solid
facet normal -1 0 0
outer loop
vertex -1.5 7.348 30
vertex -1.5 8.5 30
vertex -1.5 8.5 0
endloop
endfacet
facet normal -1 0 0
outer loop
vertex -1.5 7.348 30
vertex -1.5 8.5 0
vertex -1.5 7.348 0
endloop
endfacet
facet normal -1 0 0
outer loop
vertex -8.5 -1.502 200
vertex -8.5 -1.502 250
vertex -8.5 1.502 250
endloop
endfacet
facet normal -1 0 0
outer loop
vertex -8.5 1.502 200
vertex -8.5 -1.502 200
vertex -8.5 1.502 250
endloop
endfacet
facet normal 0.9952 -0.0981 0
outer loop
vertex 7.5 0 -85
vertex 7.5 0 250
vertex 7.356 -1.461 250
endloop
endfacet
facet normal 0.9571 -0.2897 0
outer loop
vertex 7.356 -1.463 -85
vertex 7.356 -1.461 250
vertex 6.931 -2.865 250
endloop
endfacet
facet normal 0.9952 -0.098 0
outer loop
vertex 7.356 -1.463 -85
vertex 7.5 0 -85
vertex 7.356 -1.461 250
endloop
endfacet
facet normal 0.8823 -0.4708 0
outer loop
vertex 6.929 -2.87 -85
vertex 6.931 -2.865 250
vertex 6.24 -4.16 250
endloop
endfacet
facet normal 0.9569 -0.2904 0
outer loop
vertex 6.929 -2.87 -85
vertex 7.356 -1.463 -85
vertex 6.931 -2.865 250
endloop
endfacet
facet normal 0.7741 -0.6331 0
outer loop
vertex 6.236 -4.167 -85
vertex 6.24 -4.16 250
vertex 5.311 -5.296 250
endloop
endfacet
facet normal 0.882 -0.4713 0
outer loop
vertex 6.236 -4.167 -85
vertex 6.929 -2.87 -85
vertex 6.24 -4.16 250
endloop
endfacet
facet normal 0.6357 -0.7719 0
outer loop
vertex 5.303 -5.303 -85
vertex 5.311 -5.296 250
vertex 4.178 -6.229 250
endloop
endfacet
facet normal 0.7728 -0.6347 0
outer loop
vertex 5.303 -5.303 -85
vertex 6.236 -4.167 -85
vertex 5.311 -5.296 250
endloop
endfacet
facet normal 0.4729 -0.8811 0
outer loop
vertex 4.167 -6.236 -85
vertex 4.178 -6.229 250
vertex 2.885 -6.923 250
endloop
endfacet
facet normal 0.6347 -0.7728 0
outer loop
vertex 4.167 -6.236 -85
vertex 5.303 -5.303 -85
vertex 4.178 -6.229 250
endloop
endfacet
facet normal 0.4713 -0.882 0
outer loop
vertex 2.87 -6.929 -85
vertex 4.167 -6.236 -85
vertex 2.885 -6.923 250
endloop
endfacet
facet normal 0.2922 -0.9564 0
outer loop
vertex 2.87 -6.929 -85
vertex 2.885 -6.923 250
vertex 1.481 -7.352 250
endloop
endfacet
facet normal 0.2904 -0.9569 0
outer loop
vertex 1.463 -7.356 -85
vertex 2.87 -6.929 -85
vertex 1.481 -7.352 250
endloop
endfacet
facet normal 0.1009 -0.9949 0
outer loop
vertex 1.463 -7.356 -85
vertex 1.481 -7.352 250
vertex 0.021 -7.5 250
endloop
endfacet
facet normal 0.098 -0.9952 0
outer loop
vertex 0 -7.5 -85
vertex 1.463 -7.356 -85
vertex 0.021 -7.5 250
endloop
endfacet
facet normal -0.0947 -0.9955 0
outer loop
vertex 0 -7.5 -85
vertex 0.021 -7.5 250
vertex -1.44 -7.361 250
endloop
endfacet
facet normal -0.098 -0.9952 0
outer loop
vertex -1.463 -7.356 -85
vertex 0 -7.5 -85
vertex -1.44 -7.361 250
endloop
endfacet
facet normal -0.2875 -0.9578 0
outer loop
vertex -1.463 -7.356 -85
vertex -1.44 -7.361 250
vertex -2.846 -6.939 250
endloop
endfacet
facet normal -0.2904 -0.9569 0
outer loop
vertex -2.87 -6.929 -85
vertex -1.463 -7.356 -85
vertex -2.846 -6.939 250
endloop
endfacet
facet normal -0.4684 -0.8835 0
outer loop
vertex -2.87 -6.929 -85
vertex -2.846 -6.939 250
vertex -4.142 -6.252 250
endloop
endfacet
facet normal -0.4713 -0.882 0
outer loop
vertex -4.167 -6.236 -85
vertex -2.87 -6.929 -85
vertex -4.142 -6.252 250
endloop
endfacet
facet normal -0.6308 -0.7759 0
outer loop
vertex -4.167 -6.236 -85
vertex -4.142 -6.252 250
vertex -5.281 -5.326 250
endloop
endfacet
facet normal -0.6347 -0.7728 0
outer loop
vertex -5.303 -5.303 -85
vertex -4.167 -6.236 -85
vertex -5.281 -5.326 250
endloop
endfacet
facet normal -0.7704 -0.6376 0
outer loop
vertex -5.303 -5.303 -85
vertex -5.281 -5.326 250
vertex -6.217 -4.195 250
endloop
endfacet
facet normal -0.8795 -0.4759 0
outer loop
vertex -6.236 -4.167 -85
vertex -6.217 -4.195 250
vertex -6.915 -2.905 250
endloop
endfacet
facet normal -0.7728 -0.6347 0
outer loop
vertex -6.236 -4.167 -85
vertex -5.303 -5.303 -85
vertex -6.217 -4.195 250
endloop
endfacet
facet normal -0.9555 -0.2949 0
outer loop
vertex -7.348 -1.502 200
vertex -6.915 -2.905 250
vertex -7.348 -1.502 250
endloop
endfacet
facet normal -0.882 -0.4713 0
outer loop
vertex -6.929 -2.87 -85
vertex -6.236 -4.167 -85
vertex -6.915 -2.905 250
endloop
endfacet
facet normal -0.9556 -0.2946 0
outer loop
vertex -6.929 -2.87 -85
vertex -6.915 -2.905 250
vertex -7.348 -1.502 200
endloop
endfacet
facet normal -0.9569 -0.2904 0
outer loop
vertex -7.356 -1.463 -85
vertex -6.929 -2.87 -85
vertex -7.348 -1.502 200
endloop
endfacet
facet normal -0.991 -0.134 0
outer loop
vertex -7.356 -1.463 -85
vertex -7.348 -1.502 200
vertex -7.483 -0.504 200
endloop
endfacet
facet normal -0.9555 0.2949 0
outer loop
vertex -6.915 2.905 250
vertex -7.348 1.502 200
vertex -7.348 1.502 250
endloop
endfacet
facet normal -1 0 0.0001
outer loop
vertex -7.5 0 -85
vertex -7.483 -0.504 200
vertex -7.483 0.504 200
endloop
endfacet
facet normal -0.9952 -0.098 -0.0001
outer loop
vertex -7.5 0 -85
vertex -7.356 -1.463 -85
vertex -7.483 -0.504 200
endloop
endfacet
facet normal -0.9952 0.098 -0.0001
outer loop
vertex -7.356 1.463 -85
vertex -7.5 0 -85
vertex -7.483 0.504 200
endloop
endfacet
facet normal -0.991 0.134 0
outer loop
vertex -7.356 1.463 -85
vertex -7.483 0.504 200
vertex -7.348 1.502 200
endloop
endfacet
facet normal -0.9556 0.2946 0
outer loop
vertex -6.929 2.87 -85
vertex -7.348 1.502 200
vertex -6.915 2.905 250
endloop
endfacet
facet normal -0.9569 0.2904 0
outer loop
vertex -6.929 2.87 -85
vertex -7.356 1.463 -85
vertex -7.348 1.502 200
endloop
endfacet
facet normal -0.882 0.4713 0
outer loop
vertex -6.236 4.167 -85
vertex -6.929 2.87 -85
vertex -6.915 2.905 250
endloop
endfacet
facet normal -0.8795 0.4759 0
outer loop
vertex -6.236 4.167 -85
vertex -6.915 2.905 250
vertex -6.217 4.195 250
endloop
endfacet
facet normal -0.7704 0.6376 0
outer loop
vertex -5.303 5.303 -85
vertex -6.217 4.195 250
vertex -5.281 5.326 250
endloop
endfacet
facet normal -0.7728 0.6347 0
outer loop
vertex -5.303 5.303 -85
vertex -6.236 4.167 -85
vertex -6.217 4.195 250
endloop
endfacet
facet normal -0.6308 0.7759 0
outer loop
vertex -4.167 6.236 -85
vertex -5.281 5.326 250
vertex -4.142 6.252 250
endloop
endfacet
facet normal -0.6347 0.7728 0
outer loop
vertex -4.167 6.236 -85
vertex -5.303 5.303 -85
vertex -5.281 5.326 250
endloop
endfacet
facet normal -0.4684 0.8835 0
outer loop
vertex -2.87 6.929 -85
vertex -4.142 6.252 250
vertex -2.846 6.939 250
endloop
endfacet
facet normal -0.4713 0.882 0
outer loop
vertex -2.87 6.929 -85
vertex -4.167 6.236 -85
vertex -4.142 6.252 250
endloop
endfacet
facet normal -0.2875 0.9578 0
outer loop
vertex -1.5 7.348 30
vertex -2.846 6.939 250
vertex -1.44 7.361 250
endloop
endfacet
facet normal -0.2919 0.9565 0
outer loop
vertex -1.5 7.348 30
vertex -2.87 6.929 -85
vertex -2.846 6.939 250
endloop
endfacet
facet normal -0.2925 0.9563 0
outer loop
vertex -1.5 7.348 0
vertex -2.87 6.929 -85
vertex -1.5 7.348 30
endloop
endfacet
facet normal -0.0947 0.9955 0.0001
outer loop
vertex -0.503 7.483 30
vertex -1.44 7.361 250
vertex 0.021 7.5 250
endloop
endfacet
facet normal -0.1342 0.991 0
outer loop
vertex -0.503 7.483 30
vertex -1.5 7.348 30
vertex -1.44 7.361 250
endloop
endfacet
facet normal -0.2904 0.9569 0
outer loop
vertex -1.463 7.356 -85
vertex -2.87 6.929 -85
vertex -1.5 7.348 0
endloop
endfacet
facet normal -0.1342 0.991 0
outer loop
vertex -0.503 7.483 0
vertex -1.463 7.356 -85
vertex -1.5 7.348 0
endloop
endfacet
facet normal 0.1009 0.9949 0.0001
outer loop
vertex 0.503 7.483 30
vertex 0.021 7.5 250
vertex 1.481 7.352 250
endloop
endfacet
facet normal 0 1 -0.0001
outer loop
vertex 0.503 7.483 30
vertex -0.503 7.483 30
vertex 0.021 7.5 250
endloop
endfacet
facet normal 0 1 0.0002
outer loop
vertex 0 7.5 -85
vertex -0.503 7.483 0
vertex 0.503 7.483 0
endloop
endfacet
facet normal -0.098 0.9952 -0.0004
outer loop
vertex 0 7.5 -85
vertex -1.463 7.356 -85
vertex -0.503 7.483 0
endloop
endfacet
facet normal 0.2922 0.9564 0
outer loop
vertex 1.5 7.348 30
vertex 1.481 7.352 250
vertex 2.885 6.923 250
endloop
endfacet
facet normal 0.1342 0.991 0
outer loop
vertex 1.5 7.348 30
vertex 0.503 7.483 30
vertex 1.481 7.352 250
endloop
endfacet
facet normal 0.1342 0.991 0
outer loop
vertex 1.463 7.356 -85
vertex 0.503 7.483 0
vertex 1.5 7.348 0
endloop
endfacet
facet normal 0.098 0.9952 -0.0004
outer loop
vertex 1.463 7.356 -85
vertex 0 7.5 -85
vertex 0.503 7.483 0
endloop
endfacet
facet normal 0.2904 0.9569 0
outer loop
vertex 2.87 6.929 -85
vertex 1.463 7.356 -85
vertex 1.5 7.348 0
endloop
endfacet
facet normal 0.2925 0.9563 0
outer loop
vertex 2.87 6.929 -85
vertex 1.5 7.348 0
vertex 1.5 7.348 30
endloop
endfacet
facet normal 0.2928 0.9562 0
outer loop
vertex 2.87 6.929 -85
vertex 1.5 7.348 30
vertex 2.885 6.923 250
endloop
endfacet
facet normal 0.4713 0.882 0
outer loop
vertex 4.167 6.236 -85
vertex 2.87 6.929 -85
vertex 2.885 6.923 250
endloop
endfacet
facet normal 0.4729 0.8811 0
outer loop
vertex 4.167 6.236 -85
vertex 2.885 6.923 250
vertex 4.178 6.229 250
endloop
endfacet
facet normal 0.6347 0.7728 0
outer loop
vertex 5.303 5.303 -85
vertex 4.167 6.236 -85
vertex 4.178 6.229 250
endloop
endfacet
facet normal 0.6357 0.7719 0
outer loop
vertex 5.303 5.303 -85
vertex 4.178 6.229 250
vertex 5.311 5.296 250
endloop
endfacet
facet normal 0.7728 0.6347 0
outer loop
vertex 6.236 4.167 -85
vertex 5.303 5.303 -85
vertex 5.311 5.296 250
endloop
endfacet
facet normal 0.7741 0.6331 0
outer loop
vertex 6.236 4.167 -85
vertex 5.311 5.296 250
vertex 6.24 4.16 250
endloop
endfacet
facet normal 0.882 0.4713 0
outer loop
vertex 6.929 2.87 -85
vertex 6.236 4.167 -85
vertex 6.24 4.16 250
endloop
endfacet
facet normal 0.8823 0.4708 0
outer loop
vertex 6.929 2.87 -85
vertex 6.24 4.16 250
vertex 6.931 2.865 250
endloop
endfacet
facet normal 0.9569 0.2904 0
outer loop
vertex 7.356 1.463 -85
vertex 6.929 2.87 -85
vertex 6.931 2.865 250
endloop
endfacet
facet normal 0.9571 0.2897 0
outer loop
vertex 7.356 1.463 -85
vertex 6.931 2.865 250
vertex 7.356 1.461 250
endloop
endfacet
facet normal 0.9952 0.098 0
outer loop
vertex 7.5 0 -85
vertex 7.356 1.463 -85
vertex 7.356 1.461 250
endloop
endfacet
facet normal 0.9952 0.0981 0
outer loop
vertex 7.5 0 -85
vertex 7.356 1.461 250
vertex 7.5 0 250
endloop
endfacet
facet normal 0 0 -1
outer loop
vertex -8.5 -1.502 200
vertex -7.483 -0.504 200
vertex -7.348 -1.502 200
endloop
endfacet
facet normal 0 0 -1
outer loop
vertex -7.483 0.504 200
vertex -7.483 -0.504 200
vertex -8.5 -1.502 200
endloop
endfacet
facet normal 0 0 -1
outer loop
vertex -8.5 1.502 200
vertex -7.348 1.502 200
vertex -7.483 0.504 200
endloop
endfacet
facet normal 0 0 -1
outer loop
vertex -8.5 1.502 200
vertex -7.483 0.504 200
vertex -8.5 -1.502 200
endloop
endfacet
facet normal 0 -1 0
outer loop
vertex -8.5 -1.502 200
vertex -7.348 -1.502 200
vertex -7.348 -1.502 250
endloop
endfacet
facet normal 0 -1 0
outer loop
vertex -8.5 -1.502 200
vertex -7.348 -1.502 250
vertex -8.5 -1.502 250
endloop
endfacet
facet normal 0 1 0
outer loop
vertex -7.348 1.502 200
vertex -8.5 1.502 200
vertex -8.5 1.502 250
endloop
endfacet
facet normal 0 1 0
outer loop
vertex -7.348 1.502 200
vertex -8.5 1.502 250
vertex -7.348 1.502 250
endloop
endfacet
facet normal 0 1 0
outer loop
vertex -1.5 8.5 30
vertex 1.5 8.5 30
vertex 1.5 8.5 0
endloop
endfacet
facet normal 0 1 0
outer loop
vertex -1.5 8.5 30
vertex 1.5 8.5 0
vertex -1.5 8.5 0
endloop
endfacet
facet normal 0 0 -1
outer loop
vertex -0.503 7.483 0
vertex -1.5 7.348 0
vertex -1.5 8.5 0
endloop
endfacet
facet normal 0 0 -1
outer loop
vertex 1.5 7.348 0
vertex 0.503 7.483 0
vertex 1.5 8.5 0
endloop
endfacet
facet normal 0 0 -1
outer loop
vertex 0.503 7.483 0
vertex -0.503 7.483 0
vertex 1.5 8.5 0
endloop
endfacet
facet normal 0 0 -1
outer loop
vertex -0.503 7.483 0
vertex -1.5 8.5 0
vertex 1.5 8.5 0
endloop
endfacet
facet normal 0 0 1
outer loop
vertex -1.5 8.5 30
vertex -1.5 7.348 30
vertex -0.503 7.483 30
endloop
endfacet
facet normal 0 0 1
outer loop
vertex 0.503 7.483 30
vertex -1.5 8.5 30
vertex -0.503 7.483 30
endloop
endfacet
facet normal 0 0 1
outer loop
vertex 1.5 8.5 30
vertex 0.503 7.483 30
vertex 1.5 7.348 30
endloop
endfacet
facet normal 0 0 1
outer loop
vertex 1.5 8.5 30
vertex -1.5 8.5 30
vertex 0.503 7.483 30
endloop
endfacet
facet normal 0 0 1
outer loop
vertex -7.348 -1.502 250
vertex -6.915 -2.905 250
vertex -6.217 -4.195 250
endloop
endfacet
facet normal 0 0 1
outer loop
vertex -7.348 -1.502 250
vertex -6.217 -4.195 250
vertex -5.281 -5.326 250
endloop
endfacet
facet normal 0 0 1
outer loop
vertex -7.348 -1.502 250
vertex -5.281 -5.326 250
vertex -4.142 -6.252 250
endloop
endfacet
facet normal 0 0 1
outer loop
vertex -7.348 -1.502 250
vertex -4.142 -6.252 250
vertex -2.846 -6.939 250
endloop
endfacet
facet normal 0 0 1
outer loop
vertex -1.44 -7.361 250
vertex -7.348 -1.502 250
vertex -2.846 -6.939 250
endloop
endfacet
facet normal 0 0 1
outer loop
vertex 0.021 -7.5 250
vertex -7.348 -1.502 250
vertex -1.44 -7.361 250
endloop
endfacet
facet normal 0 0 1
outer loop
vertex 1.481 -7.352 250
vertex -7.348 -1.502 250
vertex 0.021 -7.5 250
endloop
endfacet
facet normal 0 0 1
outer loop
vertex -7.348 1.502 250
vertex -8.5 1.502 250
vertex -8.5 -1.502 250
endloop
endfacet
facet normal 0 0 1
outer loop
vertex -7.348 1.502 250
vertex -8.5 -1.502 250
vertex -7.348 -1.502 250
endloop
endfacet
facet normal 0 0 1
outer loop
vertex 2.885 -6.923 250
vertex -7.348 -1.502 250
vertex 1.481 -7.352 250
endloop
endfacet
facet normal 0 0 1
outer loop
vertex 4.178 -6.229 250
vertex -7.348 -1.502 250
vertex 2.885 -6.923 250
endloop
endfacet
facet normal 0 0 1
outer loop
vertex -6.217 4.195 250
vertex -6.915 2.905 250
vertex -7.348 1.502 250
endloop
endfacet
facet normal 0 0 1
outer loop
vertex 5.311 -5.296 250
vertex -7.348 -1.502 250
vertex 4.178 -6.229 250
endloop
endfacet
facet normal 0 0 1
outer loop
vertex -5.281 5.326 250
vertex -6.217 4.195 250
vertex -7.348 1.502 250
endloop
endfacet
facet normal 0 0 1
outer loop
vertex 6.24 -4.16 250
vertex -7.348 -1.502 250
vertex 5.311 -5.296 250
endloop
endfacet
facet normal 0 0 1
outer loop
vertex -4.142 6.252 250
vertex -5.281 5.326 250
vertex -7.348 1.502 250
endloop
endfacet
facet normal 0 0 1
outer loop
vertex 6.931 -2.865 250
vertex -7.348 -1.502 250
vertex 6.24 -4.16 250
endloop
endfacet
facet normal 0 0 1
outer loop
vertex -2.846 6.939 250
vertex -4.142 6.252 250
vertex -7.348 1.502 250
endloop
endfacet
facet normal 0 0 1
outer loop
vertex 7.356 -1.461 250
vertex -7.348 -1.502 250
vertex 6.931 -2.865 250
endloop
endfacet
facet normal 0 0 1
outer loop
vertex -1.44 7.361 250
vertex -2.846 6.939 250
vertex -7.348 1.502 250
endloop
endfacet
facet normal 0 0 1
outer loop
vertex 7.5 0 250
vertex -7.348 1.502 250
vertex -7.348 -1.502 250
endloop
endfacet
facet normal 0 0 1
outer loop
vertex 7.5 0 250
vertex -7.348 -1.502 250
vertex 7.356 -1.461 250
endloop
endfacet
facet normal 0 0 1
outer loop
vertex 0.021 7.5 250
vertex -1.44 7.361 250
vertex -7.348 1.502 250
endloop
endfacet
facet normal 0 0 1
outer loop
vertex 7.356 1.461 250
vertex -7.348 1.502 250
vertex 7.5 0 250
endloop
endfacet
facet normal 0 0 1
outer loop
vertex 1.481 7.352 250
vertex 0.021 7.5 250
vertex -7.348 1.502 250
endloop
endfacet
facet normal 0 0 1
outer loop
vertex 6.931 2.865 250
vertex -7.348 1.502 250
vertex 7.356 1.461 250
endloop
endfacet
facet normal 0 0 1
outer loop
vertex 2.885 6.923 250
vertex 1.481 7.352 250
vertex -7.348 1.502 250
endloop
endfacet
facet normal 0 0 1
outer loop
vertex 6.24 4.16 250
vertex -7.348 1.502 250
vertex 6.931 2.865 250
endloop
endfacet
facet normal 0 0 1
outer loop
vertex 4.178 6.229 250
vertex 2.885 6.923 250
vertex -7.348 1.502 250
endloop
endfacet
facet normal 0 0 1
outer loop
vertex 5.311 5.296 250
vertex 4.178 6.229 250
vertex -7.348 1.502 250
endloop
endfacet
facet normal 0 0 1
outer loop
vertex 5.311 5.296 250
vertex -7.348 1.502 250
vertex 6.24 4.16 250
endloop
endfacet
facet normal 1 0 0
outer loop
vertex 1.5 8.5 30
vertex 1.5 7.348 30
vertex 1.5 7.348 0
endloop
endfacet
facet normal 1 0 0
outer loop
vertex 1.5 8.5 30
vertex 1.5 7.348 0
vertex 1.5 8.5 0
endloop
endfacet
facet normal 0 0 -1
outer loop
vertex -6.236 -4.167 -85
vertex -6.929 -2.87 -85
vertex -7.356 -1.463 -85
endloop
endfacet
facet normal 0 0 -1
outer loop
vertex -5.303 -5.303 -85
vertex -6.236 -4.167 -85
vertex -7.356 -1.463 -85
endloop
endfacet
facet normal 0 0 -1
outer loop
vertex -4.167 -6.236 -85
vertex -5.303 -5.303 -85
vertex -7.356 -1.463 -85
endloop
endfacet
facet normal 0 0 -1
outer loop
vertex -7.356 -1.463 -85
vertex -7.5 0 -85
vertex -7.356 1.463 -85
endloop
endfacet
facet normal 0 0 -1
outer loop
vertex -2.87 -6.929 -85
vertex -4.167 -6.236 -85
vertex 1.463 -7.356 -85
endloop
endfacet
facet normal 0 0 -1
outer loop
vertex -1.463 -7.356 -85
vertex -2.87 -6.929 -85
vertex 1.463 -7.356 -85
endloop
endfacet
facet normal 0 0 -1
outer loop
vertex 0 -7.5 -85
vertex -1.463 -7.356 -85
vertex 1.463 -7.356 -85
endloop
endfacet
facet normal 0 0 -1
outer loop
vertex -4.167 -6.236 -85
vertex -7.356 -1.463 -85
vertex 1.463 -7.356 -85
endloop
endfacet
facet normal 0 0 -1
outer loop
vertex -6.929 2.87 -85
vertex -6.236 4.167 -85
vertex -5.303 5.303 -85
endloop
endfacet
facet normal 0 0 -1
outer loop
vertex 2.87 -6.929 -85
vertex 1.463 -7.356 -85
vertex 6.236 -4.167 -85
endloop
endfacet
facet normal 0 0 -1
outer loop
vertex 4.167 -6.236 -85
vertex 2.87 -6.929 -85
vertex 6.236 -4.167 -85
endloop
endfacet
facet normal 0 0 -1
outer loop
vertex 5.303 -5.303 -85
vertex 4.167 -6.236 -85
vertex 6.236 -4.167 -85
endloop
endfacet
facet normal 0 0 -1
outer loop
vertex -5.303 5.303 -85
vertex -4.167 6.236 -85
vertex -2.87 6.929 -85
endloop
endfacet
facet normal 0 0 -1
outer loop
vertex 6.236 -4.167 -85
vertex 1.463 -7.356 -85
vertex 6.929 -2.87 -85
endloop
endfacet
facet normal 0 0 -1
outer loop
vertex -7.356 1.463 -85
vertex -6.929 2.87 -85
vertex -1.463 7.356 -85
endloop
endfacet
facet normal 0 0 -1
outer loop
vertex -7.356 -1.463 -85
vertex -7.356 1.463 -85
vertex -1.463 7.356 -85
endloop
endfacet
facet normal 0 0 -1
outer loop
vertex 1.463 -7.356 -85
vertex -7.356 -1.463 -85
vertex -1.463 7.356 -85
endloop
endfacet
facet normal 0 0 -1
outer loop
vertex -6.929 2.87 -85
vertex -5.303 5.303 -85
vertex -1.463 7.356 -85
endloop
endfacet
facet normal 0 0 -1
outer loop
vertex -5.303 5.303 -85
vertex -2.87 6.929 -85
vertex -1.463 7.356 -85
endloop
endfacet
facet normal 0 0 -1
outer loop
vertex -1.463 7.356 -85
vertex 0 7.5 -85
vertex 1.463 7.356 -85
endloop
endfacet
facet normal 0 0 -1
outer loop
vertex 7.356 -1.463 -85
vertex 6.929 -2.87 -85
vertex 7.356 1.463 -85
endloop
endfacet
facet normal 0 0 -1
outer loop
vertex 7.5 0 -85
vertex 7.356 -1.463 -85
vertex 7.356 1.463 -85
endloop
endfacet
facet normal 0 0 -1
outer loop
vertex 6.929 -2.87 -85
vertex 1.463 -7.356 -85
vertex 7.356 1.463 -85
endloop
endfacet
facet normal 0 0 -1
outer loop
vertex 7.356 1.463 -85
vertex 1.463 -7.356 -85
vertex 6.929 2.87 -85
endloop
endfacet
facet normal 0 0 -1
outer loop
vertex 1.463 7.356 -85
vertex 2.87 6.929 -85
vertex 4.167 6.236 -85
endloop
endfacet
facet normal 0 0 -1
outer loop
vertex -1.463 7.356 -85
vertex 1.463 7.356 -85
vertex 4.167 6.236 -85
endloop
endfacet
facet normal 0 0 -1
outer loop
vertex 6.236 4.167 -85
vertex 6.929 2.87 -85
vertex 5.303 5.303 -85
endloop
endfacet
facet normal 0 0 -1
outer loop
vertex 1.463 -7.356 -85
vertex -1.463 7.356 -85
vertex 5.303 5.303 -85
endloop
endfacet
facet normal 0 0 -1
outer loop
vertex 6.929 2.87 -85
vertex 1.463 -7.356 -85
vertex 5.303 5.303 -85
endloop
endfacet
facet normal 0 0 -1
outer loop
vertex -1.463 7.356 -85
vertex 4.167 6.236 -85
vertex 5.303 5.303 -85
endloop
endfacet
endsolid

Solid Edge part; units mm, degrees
sketch "Sketch1" plane through (0, 0, 0) normal (0, 0, 1) x (1, 0, 0)
  circle A0 centre (0, 0) radius 7.5
  dimension "D1" = 15
extrude "ExtrudedProtrusion_1" add sketch "Sketch1" along normal blind 250 and the other way blind 85
sketch "Sketch2" plane through (0, 0, 0) normal (0, 0, 1) x (1, 0, 0)
  line L0 (-1.5, 6.5) -> (1.5, 6.5)
  line L1 (1.5, 6.5) -> (1.5, 8.5)
  line L2 (1.5, 8.5) -> (-1.5, 8.5)
  line L3 (-1.5, 8.5) -> (-1.5, 6.5)
  dimension "D1" = 6.5
  dimension "D2" = 3
extrude "ExtrudedProtrusion_2" add sketch "Sketch2" along normal blind 30
sketch "Sketch3" plane through (0, 0, 250) normal (0, 0, 1) x (0, 1, 0)
  line L0 (1.5023, 6.5) -> (-1.5023, 6.5)
  line L1 (-1.5023, 6.5) -> (-1.5023, 8.5)
  line L2 (-1.5023, 8.5) -> (1.5023, 8.5)
  line L3 (1.5023, 8.5) -> (1.5023, 6.5)
  dimension "D1" = 3.0045
  dimension "D2" = 2
  dimension "D3" = 6.5
extrude "ExtrudedProtrusion_3" add sketch "Sketch3" against normal blind 50
properties material "Aluminum, 1060"
